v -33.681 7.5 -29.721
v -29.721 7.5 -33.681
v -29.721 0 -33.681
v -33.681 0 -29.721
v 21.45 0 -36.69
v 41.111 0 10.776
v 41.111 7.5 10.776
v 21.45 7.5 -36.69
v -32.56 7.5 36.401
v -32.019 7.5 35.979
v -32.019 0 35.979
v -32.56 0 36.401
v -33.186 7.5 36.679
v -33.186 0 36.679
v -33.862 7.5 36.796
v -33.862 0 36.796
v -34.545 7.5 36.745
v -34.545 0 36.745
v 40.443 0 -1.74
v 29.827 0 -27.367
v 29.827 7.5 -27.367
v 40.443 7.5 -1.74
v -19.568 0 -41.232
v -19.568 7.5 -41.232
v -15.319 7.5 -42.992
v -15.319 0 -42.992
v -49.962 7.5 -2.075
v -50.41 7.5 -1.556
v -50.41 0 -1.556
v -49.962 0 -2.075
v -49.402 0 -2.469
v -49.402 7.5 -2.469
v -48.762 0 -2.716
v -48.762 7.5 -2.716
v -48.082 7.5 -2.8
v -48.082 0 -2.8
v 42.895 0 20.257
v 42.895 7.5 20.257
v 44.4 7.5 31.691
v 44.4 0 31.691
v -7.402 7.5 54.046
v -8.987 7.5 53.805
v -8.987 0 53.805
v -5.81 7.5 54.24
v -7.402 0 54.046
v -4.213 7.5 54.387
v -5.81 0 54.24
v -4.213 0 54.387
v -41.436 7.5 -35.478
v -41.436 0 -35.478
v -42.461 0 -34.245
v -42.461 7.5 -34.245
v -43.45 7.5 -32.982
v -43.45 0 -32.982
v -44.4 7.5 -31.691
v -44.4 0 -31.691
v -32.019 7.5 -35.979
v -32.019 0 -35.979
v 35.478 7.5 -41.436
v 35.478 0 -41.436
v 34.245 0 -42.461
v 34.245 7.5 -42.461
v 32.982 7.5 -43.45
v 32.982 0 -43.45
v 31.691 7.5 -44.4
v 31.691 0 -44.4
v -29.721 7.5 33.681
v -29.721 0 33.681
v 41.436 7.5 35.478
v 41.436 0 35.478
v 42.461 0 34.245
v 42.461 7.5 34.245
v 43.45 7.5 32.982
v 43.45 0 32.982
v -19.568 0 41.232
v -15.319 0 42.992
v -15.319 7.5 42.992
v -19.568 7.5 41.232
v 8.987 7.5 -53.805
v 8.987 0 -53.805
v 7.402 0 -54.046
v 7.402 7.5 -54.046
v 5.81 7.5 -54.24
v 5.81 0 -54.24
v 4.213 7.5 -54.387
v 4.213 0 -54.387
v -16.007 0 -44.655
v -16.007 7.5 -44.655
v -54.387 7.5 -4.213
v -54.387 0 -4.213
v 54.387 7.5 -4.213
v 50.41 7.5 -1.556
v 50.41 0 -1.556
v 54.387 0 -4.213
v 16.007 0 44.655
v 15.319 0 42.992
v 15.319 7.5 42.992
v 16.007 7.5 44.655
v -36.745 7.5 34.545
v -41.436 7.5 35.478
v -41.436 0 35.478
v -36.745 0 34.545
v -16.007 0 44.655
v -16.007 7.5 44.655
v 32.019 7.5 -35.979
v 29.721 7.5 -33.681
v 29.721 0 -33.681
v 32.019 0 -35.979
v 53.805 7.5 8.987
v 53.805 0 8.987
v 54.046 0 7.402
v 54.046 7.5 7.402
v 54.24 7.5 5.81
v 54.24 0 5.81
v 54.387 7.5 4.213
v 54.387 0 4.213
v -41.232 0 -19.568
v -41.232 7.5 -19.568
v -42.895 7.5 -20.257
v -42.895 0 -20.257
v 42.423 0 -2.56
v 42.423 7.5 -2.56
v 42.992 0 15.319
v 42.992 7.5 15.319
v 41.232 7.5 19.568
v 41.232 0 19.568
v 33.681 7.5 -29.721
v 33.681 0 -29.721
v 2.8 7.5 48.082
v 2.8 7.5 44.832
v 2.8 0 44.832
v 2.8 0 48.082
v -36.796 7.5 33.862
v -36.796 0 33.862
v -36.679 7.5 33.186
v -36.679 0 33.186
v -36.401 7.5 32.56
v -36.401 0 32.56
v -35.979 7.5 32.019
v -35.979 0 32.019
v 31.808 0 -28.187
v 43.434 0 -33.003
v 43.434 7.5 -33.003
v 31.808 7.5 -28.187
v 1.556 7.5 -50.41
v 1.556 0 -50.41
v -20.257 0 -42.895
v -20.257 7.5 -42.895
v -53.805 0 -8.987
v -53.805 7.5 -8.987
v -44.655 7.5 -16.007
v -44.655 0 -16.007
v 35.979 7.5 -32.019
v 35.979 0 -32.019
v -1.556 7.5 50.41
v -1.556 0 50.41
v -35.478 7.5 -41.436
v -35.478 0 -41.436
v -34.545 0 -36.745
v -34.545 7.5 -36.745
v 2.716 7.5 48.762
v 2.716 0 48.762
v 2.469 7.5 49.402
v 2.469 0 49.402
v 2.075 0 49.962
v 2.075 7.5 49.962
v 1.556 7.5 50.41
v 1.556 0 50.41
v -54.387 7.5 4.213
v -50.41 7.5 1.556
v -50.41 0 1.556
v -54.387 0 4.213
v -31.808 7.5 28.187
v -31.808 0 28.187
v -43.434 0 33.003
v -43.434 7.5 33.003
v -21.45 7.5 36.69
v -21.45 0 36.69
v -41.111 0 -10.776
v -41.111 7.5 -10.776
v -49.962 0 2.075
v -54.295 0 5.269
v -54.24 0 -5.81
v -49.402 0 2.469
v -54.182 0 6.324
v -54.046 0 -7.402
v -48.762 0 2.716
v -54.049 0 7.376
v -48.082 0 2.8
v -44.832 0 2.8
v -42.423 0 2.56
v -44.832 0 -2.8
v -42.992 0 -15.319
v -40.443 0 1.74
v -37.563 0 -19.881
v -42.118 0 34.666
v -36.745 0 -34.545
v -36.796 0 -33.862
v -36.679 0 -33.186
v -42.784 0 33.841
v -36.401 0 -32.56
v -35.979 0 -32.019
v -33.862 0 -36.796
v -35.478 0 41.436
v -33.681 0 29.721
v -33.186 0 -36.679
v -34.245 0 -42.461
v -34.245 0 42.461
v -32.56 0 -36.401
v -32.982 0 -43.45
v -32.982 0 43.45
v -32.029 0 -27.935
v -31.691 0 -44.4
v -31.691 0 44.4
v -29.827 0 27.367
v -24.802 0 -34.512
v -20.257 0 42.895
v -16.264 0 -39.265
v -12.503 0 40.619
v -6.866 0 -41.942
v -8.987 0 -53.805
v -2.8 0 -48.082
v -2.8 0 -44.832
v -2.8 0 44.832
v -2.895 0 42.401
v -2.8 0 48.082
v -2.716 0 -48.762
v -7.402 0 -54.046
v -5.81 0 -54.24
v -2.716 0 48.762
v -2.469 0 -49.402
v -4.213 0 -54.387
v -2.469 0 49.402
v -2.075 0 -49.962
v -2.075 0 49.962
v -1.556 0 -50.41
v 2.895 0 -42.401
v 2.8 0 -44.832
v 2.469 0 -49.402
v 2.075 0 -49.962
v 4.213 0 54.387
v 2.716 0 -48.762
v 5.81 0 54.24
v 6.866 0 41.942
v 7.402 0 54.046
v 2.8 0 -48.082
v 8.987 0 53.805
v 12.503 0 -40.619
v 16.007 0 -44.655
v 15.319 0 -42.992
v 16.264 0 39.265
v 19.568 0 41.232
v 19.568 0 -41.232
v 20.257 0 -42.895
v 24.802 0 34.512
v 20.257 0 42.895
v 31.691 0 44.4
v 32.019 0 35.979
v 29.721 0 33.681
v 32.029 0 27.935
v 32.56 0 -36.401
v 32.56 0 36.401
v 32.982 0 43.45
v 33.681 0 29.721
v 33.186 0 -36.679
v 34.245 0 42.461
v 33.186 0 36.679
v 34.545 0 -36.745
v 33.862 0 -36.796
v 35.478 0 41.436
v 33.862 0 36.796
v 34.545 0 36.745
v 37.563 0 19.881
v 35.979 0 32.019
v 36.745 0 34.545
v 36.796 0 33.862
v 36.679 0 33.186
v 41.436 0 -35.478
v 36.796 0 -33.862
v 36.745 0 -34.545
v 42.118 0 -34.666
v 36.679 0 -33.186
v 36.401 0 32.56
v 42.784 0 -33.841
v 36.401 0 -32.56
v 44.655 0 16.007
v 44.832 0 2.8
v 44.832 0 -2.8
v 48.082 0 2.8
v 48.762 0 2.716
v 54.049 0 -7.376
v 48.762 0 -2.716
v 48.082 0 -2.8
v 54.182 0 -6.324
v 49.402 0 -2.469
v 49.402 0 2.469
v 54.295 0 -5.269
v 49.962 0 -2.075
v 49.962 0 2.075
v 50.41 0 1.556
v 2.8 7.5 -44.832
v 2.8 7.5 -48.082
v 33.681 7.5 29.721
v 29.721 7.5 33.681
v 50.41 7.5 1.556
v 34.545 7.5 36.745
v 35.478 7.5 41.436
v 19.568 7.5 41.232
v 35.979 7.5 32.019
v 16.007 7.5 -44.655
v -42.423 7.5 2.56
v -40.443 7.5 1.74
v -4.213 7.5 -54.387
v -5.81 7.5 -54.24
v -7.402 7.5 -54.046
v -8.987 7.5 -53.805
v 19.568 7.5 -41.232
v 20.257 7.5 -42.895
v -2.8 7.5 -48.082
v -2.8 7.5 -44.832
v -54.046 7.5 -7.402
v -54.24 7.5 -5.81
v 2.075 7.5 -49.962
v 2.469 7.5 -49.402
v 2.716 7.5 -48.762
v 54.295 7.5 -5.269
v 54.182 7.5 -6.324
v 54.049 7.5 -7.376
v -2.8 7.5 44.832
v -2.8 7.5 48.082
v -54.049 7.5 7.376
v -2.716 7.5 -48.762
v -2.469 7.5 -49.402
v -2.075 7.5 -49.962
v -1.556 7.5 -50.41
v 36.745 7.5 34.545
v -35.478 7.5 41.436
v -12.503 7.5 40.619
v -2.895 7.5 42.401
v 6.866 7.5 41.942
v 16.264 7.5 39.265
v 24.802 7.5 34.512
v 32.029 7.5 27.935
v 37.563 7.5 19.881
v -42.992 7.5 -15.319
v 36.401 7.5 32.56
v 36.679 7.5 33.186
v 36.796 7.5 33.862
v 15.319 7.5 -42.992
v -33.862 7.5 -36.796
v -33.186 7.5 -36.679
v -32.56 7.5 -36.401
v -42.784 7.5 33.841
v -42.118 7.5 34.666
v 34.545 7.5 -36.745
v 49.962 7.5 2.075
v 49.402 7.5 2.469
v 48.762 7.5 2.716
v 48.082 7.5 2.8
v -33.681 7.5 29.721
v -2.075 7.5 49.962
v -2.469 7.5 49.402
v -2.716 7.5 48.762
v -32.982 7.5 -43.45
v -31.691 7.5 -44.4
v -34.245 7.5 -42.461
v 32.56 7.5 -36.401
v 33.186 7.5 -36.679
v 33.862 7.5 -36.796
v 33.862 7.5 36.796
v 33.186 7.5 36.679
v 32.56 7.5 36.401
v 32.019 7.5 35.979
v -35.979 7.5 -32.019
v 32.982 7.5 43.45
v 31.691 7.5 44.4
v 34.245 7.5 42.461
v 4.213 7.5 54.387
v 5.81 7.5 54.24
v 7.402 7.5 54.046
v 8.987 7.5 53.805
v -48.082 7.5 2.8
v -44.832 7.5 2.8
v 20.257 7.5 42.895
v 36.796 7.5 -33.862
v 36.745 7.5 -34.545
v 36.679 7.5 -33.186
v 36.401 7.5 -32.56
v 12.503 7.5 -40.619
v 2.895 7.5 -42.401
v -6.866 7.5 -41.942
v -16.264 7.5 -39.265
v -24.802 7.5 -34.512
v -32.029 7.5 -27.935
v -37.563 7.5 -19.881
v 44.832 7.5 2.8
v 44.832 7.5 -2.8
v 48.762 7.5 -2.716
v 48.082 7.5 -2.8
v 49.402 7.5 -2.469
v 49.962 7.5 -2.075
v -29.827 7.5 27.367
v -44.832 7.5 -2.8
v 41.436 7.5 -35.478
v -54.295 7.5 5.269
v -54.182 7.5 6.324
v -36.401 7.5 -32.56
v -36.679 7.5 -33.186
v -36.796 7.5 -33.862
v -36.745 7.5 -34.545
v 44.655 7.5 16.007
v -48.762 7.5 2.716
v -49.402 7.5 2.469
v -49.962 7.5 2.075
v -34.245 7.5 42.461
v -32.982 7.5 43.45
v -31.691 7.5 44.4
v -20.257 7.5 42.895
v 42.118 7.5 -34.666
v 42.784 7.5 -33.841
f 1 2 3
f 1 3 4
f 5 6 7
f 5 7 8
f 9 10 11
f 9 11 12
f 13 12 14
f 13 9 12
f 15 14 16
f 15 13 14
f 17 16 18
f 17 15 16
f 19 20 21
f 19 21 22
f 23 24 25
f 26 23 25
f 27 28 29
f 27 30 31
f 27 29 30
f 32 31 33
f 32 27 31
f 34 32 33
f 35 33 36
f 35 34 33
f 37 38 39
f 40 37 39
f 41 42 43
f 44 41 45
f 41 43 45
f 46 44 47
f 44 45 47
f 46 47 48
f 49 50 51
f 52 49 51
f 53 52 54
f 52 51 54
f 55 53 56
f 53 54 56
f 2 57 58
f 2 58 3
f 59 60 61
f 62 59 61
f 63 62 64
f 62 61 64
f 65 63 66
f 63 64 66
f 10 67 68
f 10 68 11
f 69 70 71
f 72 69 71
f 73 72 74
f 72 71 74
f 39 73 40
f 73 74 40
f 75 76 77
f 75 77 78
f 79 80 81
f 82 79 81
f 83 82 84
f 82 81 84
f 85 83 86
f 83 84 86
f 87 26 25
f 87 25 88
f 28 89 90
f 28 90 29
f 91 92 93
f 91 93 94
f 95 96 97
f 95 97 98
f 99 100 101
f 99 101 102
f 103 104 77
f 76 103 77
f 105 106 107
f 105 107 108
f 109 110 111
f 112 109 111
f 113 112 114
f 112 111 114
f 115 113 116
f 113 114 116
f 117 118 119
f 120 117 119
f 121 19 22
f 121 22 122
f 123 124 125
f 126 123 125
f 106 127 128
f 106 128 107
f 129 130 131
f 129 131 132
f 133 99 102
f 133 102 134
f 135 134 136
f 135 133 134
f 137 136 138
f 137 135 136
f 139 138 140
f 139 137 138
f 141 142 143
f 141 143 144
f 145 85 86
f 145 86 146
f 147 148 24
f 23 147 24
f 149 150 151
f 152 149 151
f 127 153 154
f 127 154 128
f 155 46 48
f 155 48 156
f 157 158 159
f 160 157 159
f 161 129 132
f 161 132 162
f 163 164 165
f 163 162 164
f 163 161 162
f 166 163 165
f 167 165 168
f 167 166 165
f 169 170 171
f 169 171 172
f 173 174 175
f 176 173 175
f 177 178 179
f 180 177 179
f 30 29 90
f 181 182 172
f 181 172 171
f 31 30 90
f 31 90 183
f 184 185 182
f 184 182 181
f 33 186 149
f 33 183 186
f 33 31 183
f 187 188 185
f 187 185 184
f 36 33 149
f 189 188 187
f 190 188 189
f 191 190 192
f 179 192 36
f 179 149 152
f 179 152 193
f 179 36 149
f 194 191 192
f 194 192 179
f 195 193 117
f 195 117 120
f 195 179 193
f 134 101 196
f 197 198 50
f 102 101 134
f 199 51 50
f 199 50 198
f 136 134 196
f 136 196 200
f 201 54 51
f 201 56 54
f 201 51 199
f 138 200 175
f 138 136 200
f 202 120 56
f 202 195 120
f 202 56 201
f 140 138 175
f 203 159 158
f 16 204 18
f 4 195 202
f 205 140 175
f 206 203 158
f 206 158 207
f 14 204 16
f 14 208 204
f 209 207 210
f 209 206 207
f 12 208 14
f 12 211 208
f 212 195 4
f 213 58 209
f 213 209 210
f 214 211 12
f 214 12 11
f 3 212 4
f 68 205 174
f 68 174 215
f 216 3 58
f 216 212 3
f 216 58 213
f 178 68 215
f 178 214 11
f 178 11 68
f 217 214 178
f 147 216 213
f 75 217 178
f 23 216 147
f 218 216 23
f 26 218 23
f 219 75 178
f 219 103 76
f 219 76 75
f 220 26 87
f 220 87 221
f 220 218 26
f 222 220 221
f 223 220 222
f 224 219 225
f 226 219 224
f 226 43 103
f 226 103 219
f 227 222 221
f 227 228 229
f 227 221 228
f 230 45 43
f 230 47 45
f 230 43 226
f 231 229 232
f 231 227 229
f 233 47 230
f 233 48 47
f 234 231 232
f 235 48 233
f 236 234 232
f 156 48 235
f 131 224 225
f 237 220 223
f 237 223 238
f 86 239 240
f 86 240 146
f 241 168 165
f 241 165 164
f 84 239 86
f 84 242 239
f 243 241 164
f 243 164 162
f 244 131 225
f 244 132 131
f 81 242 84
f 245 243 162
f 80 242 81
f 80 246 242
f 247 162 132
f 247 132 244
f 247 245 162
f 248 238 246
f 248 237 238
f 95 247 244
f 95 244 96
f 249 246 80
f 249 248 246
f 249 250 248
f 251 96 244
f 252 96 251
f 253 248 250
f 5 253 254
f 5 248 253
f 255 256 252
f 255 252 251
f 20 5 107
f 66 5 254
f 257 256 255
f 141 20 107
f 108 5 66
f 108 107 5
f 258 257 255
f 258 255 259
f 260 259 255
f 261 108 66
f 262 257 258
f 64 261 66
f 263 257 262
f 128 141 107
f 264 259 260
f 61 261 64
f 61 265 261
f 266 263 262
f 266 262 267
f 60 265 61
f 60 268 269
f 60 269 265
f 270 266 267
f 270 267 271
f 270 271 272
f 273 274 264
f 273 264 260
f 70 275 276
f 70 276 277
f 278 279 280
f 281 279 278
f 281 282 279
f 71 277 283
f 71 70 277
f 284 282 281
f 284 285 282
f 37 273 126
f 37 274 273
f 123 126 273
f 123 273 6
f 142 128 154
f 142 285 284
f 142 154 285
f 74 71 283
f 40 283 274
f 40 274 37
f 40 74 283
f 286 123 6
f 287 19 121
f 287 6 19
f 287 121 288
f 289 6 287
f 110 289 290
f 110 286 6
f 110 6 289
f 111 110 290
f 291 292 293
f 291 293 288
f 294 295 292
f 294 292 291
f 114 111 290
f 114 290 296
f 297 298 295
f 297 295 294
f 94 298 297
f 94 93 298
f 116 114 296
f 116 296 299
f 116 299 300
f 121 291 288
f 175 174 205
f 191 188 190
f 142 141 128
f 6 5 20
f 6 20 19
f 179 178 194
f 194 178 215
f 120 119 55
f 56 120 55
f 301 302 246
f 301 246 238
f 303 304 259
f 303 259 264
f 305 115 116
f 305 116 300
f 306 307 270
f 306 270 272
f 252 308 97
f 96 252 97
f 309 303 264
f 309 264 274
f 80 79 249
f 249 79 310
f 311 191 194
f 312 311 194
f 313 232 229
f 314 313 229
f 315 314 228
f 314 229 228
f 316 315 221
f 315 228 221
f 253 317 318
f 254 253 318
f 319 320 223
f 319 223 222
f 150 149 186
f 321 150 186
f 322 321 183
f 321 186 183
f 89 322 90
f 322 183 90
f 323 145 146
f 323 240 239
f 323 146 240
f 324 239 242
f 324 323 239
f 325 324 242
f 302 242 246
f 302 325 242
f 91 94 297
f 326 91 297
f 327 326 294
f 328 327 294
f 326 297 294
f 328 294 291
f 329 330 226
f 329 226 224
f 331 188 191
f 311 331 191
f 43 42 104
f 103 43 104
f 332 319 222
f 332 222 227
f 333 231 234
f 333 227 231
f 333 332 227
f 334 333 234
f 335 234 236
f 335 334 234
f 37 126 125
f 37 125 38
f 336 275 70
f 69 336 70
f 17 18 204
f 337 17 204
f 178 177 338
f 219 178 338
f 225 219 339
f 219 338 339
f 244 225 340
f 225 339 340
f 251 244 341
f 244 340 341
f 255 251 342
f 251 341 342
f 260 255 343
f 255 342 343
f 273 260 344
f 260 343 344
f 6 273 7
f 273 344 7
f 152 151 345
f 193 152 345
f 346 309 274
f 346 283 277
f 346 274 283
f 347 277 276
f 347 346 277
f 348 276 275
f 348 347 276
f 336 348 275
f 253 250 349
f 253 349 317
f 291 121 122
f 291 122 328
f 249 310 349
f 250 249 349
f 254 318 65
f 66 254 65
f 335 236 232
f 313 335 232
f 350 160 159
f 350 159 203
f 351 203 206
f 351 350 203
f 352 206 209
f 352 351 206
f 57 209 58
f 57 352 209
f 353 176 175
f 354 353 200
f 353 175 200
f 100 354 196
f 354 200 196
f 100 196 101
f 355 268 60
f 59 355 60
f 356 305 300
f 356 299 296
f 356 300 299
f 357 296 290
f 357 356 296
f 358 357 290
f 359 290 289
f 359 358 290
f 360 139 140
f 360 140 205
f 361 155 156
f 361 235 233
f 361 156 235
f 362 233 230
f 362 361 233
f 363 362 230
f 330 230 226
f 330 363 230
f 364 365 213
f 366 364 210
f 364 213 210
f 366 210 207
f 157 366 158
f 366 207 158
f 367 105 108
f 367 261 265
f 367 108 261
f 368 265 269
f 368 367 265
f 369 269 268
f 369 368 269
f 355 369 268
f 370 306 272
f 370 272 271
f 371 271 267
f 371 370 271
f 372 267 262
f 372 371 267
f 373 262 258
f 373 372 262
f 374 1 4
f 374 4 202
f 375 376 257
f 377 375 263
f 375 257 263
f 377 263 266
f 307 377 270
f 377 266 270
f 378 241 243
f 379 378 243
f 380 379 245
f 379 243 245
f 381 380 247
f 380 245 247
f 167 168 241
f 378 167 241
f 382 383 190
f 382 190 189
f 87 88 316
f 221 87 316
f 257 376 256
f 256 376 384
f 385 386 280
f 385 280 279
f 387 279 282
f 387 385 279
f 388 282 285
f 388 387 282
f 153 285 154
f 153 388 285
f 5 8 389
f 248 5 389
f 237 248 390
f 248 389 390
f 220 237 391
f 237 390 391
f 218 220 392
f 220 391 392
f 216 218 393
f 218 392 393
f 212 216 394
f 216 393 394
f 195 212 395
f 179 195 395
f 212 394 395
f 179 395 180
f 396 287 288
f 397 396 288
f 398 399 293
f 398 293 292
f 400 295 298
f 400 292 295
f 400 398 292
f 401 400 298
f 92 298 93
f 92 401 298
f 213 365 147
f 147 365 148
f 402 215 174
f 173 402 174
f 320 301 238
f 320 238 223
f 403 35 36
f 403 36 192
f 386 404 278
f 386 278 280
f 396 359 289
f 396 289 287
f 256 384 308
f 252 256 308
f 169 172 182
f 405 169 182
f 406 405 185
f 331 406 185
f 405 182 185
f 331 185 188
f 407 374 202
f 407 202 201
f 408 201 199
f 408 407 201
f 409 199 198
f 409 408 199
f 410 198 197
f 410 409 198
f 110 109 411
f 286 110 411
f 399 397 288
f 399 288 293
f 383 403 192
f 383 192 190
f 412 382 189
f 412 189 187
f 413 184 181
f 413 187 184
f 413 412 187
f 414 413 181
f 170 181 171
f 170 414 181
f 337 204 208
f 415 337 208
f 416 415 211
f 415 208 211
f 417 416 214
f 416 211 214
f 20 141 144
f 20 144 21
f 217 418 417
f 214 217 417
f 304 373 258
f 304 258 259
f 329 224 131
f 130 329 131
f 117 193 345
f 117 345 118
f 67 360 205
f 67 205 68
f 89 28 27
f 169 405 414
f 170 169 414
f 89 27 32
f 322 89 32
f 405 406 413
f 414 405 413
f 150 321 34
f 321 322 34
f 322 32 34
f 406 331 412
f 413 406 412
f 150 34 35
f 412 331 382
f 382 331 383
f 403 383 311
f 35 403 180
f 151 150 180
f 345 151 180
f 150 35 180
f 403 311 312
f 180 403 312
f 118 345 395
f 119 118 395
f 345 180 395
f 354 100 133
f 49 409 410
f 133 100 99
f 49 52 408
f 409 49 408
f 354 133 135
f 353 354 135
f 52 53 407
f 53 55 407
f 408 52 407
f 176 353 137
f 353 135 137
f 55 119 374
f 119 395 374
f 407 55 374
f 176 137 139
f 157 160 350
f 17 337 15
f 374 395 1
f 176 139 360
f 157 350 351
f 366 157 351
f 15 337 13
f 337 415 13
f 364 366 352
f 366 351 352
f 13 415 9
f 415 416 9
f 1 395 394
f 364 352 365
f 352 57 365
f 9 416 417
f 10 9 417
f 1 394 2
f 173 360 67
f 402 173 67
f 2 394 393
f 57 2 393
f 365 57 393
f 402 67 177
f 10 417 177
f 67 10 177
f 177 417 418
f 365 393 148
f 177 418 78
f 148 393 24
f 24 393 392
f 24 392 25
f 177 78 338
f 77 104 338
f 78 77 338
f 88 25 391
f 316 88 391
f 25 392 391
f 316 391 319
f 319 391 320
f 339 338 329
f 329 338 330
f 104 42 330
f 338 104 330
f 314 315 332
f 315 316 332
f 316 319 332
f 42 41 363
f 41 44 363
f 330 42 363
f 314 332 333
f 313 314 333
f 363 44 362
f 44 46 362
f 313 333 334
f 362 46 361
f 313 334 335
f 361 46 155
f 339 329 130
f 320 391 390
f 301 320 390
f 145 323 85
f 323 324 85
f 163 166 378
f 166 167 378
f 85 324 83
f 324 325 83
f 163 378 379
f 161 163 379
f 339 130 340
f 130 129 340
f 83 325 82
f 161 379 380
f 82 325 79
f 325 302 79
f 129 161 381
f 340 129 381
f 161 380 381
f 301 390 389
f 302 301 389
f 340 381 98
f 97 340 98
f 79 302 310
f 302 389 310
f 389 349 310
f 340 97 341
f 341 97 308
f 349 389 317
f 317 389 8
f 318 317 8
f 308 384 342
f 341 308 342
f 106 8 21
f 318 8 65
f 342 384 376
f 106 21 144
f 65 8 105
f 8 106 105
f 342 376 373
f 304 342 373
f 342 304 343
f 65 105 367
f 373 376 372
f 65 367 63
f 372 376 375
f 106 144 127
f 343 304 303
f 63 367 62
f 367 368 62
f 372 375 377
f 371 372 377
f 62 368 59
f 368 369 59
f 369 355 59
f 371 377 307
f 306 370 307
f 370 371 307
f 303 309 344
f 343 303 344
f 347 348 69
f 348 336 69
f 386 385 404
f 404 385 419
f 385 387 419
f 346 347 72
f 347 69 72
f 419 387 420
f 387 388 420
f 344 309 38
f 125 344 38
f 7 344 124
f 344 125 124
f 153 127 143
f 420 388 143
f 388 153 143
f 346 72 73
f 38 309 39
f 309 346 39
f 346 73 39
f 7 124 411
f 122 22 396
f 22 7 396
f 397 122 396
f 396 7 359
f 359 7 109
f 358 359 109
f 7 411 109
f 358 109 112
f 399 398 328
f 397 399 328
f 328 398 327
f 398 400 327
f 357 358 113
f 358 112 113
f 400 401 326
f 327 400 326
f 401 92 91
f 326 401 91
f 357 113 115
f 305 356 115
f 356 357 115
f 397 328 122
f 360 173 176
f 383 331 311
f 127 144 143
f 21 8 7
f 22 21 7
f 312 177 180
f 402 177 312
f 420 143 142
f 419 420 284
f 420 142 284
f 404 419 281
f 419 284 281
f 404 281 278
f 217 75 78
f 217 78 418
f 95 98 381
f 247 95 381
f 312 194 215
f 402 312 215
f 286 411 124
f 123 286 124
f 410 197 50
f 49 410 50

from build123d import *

# Parameters (mm, degrees)
SKETCH1_R           = 54.55
BOSS_EXTRUDE1_DEPTH = 7.5
SKETCH2_R           = 42.5
CUT_EXTRUDE1_DEPTH  = 78.509063986
CUT_EXTRUDE2_DEPTH  = 78.509063986
CUT_EXTRUDE6_DEPTH  = 78.509063986
CIRPATTERN1_COUNT   = 8
CIRPATTERN2_COUNT   = 8
CUT_EXTRUDE7_DEPTH  = 78.279736538
BOSS_EXTRUDE2_DEPTH = 7.5


with BuildPart() as part:
    # Sketch1 → Boss-Extrude1 (new body)
    with BuildSketch(Plane(origin=(0, 0, 0), x_dir=(1, 0, 0), z_dir=(0, 1, 0))):
        with Locations(Location((0, 0, 0), (0, 0, 270))):
            Circle(SKETCH1_R)
    extrude(amount=BOSS_EXTRUDE1_DEPTH)

    # Sketch2 → Cut-Extrude1 (cut, through all)
    with BuildSketch(Plane(origin=(0, 7.5, 0), x_dir=(1, 0, 0), z_dir=(0, 1, 0))):
        with Locations(Location((0, 0, 0), (0, 0, 270))):
            Circle(SKETCH2_R)
    extrude(amount=-CUT_EXTRUDE1_DEPTH, mode=Mode.SUBTRACT)

    # Sketch3 → Cut-Extrude2 (cut, through all)
    with BuildSketch(Plane(origin=(0, 7.5, 0), x_dir=(1, 0, 0), z_dir=(0, 1, 0))):
        with BuildLine():
            Line((-2.8, -48.082), (-2.8, -44.832))
            Line((-2.8, -44.832), (2.8, -44.832))
            Line((2.8, -44.832), (2.8, -48.082))
            ThreePointArc((2.8, -48.082), (2.46937954, -49.401910863), (1.555596652, -50.410114914))
            Line((1.555596652, -50.410114914), (4.212915889, -54.387074197))
            ThreePointArc((4.212915889, -54.387074197), (0, -54.55), (-4.212915889, -54.387074197))
            Line((-4.212915889, -54.387074197), (-1.555596652, -50.410114914))
            ThreePointArc((-1.555596652, -50.410114914), (-2.46937954, -49.401910863), (-2.8, -48.082))
        make_face()
    cut_extrude2 = extrude(amount=-CUT_EXTRUDE2_DEPTH, mode=Mode.SUBTRACT)

    # Sketch9 → Cut-Extrude6 (cut, through all)
    with BuildSketch(Plane(origin=(0, 7.5, 0), x_dir=(1, 0, 0), z_dir=(0, 1, 0))):
        with BuildLine():
            Line((-20.257229317, -42.895088115), (-31.690865911, -44.400354929))
            ThreePointArc((-31.690865911, -44.400354929), (-20.875381236, -50.397628498), (-8.98696587, -53.804618245))
            Line((-8.98696587, -53.804618245), (-16.007383468, -44.655431904))
            Line((-16.007383468, -44.655431904), (-15.318553289, -42.992448745))
            Line((-15.318553289, -42.992448745), (-19.568399139, -41.232104956))
            Line((-19.568399139, -41.232104956), (-20.257229317, -42.895088115))
        make_face()
    cut_extrude6 = extrude(amount=-CUT_EXTRUDE6_DEPTH, mode=Mode.SUBTRACT)

    # CirPattern1: Cut-Extrude2 ×8 about axis
    cirpattern1_axis = Axis((0, 0, 0), (0, 1, 0))
    for i in range(1, CIRPATTERN1_COUNT):
        add(cut_extrude2.rotate(cirpattern1_axis, i * 360 / CIRPATTERN1_COUNT), mode=Mode.SUBTRACT)

    # CirPattern2: Cut-Extrude6 ×8 about axis, 2 skipped
    cirpattern2_axis = Axis((0, 10.872185225, 0), (0, -1, 0))
    add([cut_extrude6.rotate(cirpattern2_axis, i * 360 / CIRPATTERN2_COUNT) for i in range(1, CIRPATTERN2_COUNT) if i not in (1, 5)], mode=Mode.SUBTRACT)

    # Sketch10 → Cut-Extrude7 (cut, through all)
    with BuildSketch(Plane.XZ):
        Polygon((-42.422842704, 2.559768914), (-31.807509711, 28.187449796), (-46.056303911, 34.089493601), (-56.671636904, 8.461812719), align=None)
    cut_extrude7 = extrude(amount=-CUT_EXTRUDE7_DEPTH, mode=Mode.SUBTRACT)

    # Sketch11 → Boss-Extrude2 (add, through all)
    with BuildSketch(Plane.XZ):
        with BuildLine():
            Line((-42.422842704, 2.559768914), (-40.442805118, 1.739610492))
            Line((-40.442805118, 1.739610492), (-29.827472125, 27.367291374))
            Line((-29.827472125, 27.367291374), (-31.807509711, 28.187449796))
            ThreePointArc((-31.807509711, 28.187449796), (-26.965878836, 32.849526307), (-21.449800959, 36.689999166))
            Line((-21.449800959, 36.689999166), (-41.111046925, -10.776447499))
            ThreePointArc((-41.111046925, -10.776447499), (-42.295878596, -4.160367025), (-42.422842704, 2.559768914))
        make_face()
    boss_extrude2 = extrude(amount=-BOSS_EXTRUDE2_DEPTH)

    # Mirror1: Cut-Extrude7, Boss-Extrude2 across plane
    add(cut_extrude7.mirror(Plane(origin=(0, 0, 0), x_dir=(0.38268343236508123, 0, 0.9238795325112903), z_dir=(0.9238795325112903, 0, -0.38268343236508123))), mode=Mode.SUBTRACT)
    add(boss_extrude2.mirror(Plane(origin=(0, 0, 0), x_dir=(0.38268343236508123, 0, 0.9238795325112903), z_dir=(0.9238795325112903, 0, -0.38268343236508123))))


solid = part.part
